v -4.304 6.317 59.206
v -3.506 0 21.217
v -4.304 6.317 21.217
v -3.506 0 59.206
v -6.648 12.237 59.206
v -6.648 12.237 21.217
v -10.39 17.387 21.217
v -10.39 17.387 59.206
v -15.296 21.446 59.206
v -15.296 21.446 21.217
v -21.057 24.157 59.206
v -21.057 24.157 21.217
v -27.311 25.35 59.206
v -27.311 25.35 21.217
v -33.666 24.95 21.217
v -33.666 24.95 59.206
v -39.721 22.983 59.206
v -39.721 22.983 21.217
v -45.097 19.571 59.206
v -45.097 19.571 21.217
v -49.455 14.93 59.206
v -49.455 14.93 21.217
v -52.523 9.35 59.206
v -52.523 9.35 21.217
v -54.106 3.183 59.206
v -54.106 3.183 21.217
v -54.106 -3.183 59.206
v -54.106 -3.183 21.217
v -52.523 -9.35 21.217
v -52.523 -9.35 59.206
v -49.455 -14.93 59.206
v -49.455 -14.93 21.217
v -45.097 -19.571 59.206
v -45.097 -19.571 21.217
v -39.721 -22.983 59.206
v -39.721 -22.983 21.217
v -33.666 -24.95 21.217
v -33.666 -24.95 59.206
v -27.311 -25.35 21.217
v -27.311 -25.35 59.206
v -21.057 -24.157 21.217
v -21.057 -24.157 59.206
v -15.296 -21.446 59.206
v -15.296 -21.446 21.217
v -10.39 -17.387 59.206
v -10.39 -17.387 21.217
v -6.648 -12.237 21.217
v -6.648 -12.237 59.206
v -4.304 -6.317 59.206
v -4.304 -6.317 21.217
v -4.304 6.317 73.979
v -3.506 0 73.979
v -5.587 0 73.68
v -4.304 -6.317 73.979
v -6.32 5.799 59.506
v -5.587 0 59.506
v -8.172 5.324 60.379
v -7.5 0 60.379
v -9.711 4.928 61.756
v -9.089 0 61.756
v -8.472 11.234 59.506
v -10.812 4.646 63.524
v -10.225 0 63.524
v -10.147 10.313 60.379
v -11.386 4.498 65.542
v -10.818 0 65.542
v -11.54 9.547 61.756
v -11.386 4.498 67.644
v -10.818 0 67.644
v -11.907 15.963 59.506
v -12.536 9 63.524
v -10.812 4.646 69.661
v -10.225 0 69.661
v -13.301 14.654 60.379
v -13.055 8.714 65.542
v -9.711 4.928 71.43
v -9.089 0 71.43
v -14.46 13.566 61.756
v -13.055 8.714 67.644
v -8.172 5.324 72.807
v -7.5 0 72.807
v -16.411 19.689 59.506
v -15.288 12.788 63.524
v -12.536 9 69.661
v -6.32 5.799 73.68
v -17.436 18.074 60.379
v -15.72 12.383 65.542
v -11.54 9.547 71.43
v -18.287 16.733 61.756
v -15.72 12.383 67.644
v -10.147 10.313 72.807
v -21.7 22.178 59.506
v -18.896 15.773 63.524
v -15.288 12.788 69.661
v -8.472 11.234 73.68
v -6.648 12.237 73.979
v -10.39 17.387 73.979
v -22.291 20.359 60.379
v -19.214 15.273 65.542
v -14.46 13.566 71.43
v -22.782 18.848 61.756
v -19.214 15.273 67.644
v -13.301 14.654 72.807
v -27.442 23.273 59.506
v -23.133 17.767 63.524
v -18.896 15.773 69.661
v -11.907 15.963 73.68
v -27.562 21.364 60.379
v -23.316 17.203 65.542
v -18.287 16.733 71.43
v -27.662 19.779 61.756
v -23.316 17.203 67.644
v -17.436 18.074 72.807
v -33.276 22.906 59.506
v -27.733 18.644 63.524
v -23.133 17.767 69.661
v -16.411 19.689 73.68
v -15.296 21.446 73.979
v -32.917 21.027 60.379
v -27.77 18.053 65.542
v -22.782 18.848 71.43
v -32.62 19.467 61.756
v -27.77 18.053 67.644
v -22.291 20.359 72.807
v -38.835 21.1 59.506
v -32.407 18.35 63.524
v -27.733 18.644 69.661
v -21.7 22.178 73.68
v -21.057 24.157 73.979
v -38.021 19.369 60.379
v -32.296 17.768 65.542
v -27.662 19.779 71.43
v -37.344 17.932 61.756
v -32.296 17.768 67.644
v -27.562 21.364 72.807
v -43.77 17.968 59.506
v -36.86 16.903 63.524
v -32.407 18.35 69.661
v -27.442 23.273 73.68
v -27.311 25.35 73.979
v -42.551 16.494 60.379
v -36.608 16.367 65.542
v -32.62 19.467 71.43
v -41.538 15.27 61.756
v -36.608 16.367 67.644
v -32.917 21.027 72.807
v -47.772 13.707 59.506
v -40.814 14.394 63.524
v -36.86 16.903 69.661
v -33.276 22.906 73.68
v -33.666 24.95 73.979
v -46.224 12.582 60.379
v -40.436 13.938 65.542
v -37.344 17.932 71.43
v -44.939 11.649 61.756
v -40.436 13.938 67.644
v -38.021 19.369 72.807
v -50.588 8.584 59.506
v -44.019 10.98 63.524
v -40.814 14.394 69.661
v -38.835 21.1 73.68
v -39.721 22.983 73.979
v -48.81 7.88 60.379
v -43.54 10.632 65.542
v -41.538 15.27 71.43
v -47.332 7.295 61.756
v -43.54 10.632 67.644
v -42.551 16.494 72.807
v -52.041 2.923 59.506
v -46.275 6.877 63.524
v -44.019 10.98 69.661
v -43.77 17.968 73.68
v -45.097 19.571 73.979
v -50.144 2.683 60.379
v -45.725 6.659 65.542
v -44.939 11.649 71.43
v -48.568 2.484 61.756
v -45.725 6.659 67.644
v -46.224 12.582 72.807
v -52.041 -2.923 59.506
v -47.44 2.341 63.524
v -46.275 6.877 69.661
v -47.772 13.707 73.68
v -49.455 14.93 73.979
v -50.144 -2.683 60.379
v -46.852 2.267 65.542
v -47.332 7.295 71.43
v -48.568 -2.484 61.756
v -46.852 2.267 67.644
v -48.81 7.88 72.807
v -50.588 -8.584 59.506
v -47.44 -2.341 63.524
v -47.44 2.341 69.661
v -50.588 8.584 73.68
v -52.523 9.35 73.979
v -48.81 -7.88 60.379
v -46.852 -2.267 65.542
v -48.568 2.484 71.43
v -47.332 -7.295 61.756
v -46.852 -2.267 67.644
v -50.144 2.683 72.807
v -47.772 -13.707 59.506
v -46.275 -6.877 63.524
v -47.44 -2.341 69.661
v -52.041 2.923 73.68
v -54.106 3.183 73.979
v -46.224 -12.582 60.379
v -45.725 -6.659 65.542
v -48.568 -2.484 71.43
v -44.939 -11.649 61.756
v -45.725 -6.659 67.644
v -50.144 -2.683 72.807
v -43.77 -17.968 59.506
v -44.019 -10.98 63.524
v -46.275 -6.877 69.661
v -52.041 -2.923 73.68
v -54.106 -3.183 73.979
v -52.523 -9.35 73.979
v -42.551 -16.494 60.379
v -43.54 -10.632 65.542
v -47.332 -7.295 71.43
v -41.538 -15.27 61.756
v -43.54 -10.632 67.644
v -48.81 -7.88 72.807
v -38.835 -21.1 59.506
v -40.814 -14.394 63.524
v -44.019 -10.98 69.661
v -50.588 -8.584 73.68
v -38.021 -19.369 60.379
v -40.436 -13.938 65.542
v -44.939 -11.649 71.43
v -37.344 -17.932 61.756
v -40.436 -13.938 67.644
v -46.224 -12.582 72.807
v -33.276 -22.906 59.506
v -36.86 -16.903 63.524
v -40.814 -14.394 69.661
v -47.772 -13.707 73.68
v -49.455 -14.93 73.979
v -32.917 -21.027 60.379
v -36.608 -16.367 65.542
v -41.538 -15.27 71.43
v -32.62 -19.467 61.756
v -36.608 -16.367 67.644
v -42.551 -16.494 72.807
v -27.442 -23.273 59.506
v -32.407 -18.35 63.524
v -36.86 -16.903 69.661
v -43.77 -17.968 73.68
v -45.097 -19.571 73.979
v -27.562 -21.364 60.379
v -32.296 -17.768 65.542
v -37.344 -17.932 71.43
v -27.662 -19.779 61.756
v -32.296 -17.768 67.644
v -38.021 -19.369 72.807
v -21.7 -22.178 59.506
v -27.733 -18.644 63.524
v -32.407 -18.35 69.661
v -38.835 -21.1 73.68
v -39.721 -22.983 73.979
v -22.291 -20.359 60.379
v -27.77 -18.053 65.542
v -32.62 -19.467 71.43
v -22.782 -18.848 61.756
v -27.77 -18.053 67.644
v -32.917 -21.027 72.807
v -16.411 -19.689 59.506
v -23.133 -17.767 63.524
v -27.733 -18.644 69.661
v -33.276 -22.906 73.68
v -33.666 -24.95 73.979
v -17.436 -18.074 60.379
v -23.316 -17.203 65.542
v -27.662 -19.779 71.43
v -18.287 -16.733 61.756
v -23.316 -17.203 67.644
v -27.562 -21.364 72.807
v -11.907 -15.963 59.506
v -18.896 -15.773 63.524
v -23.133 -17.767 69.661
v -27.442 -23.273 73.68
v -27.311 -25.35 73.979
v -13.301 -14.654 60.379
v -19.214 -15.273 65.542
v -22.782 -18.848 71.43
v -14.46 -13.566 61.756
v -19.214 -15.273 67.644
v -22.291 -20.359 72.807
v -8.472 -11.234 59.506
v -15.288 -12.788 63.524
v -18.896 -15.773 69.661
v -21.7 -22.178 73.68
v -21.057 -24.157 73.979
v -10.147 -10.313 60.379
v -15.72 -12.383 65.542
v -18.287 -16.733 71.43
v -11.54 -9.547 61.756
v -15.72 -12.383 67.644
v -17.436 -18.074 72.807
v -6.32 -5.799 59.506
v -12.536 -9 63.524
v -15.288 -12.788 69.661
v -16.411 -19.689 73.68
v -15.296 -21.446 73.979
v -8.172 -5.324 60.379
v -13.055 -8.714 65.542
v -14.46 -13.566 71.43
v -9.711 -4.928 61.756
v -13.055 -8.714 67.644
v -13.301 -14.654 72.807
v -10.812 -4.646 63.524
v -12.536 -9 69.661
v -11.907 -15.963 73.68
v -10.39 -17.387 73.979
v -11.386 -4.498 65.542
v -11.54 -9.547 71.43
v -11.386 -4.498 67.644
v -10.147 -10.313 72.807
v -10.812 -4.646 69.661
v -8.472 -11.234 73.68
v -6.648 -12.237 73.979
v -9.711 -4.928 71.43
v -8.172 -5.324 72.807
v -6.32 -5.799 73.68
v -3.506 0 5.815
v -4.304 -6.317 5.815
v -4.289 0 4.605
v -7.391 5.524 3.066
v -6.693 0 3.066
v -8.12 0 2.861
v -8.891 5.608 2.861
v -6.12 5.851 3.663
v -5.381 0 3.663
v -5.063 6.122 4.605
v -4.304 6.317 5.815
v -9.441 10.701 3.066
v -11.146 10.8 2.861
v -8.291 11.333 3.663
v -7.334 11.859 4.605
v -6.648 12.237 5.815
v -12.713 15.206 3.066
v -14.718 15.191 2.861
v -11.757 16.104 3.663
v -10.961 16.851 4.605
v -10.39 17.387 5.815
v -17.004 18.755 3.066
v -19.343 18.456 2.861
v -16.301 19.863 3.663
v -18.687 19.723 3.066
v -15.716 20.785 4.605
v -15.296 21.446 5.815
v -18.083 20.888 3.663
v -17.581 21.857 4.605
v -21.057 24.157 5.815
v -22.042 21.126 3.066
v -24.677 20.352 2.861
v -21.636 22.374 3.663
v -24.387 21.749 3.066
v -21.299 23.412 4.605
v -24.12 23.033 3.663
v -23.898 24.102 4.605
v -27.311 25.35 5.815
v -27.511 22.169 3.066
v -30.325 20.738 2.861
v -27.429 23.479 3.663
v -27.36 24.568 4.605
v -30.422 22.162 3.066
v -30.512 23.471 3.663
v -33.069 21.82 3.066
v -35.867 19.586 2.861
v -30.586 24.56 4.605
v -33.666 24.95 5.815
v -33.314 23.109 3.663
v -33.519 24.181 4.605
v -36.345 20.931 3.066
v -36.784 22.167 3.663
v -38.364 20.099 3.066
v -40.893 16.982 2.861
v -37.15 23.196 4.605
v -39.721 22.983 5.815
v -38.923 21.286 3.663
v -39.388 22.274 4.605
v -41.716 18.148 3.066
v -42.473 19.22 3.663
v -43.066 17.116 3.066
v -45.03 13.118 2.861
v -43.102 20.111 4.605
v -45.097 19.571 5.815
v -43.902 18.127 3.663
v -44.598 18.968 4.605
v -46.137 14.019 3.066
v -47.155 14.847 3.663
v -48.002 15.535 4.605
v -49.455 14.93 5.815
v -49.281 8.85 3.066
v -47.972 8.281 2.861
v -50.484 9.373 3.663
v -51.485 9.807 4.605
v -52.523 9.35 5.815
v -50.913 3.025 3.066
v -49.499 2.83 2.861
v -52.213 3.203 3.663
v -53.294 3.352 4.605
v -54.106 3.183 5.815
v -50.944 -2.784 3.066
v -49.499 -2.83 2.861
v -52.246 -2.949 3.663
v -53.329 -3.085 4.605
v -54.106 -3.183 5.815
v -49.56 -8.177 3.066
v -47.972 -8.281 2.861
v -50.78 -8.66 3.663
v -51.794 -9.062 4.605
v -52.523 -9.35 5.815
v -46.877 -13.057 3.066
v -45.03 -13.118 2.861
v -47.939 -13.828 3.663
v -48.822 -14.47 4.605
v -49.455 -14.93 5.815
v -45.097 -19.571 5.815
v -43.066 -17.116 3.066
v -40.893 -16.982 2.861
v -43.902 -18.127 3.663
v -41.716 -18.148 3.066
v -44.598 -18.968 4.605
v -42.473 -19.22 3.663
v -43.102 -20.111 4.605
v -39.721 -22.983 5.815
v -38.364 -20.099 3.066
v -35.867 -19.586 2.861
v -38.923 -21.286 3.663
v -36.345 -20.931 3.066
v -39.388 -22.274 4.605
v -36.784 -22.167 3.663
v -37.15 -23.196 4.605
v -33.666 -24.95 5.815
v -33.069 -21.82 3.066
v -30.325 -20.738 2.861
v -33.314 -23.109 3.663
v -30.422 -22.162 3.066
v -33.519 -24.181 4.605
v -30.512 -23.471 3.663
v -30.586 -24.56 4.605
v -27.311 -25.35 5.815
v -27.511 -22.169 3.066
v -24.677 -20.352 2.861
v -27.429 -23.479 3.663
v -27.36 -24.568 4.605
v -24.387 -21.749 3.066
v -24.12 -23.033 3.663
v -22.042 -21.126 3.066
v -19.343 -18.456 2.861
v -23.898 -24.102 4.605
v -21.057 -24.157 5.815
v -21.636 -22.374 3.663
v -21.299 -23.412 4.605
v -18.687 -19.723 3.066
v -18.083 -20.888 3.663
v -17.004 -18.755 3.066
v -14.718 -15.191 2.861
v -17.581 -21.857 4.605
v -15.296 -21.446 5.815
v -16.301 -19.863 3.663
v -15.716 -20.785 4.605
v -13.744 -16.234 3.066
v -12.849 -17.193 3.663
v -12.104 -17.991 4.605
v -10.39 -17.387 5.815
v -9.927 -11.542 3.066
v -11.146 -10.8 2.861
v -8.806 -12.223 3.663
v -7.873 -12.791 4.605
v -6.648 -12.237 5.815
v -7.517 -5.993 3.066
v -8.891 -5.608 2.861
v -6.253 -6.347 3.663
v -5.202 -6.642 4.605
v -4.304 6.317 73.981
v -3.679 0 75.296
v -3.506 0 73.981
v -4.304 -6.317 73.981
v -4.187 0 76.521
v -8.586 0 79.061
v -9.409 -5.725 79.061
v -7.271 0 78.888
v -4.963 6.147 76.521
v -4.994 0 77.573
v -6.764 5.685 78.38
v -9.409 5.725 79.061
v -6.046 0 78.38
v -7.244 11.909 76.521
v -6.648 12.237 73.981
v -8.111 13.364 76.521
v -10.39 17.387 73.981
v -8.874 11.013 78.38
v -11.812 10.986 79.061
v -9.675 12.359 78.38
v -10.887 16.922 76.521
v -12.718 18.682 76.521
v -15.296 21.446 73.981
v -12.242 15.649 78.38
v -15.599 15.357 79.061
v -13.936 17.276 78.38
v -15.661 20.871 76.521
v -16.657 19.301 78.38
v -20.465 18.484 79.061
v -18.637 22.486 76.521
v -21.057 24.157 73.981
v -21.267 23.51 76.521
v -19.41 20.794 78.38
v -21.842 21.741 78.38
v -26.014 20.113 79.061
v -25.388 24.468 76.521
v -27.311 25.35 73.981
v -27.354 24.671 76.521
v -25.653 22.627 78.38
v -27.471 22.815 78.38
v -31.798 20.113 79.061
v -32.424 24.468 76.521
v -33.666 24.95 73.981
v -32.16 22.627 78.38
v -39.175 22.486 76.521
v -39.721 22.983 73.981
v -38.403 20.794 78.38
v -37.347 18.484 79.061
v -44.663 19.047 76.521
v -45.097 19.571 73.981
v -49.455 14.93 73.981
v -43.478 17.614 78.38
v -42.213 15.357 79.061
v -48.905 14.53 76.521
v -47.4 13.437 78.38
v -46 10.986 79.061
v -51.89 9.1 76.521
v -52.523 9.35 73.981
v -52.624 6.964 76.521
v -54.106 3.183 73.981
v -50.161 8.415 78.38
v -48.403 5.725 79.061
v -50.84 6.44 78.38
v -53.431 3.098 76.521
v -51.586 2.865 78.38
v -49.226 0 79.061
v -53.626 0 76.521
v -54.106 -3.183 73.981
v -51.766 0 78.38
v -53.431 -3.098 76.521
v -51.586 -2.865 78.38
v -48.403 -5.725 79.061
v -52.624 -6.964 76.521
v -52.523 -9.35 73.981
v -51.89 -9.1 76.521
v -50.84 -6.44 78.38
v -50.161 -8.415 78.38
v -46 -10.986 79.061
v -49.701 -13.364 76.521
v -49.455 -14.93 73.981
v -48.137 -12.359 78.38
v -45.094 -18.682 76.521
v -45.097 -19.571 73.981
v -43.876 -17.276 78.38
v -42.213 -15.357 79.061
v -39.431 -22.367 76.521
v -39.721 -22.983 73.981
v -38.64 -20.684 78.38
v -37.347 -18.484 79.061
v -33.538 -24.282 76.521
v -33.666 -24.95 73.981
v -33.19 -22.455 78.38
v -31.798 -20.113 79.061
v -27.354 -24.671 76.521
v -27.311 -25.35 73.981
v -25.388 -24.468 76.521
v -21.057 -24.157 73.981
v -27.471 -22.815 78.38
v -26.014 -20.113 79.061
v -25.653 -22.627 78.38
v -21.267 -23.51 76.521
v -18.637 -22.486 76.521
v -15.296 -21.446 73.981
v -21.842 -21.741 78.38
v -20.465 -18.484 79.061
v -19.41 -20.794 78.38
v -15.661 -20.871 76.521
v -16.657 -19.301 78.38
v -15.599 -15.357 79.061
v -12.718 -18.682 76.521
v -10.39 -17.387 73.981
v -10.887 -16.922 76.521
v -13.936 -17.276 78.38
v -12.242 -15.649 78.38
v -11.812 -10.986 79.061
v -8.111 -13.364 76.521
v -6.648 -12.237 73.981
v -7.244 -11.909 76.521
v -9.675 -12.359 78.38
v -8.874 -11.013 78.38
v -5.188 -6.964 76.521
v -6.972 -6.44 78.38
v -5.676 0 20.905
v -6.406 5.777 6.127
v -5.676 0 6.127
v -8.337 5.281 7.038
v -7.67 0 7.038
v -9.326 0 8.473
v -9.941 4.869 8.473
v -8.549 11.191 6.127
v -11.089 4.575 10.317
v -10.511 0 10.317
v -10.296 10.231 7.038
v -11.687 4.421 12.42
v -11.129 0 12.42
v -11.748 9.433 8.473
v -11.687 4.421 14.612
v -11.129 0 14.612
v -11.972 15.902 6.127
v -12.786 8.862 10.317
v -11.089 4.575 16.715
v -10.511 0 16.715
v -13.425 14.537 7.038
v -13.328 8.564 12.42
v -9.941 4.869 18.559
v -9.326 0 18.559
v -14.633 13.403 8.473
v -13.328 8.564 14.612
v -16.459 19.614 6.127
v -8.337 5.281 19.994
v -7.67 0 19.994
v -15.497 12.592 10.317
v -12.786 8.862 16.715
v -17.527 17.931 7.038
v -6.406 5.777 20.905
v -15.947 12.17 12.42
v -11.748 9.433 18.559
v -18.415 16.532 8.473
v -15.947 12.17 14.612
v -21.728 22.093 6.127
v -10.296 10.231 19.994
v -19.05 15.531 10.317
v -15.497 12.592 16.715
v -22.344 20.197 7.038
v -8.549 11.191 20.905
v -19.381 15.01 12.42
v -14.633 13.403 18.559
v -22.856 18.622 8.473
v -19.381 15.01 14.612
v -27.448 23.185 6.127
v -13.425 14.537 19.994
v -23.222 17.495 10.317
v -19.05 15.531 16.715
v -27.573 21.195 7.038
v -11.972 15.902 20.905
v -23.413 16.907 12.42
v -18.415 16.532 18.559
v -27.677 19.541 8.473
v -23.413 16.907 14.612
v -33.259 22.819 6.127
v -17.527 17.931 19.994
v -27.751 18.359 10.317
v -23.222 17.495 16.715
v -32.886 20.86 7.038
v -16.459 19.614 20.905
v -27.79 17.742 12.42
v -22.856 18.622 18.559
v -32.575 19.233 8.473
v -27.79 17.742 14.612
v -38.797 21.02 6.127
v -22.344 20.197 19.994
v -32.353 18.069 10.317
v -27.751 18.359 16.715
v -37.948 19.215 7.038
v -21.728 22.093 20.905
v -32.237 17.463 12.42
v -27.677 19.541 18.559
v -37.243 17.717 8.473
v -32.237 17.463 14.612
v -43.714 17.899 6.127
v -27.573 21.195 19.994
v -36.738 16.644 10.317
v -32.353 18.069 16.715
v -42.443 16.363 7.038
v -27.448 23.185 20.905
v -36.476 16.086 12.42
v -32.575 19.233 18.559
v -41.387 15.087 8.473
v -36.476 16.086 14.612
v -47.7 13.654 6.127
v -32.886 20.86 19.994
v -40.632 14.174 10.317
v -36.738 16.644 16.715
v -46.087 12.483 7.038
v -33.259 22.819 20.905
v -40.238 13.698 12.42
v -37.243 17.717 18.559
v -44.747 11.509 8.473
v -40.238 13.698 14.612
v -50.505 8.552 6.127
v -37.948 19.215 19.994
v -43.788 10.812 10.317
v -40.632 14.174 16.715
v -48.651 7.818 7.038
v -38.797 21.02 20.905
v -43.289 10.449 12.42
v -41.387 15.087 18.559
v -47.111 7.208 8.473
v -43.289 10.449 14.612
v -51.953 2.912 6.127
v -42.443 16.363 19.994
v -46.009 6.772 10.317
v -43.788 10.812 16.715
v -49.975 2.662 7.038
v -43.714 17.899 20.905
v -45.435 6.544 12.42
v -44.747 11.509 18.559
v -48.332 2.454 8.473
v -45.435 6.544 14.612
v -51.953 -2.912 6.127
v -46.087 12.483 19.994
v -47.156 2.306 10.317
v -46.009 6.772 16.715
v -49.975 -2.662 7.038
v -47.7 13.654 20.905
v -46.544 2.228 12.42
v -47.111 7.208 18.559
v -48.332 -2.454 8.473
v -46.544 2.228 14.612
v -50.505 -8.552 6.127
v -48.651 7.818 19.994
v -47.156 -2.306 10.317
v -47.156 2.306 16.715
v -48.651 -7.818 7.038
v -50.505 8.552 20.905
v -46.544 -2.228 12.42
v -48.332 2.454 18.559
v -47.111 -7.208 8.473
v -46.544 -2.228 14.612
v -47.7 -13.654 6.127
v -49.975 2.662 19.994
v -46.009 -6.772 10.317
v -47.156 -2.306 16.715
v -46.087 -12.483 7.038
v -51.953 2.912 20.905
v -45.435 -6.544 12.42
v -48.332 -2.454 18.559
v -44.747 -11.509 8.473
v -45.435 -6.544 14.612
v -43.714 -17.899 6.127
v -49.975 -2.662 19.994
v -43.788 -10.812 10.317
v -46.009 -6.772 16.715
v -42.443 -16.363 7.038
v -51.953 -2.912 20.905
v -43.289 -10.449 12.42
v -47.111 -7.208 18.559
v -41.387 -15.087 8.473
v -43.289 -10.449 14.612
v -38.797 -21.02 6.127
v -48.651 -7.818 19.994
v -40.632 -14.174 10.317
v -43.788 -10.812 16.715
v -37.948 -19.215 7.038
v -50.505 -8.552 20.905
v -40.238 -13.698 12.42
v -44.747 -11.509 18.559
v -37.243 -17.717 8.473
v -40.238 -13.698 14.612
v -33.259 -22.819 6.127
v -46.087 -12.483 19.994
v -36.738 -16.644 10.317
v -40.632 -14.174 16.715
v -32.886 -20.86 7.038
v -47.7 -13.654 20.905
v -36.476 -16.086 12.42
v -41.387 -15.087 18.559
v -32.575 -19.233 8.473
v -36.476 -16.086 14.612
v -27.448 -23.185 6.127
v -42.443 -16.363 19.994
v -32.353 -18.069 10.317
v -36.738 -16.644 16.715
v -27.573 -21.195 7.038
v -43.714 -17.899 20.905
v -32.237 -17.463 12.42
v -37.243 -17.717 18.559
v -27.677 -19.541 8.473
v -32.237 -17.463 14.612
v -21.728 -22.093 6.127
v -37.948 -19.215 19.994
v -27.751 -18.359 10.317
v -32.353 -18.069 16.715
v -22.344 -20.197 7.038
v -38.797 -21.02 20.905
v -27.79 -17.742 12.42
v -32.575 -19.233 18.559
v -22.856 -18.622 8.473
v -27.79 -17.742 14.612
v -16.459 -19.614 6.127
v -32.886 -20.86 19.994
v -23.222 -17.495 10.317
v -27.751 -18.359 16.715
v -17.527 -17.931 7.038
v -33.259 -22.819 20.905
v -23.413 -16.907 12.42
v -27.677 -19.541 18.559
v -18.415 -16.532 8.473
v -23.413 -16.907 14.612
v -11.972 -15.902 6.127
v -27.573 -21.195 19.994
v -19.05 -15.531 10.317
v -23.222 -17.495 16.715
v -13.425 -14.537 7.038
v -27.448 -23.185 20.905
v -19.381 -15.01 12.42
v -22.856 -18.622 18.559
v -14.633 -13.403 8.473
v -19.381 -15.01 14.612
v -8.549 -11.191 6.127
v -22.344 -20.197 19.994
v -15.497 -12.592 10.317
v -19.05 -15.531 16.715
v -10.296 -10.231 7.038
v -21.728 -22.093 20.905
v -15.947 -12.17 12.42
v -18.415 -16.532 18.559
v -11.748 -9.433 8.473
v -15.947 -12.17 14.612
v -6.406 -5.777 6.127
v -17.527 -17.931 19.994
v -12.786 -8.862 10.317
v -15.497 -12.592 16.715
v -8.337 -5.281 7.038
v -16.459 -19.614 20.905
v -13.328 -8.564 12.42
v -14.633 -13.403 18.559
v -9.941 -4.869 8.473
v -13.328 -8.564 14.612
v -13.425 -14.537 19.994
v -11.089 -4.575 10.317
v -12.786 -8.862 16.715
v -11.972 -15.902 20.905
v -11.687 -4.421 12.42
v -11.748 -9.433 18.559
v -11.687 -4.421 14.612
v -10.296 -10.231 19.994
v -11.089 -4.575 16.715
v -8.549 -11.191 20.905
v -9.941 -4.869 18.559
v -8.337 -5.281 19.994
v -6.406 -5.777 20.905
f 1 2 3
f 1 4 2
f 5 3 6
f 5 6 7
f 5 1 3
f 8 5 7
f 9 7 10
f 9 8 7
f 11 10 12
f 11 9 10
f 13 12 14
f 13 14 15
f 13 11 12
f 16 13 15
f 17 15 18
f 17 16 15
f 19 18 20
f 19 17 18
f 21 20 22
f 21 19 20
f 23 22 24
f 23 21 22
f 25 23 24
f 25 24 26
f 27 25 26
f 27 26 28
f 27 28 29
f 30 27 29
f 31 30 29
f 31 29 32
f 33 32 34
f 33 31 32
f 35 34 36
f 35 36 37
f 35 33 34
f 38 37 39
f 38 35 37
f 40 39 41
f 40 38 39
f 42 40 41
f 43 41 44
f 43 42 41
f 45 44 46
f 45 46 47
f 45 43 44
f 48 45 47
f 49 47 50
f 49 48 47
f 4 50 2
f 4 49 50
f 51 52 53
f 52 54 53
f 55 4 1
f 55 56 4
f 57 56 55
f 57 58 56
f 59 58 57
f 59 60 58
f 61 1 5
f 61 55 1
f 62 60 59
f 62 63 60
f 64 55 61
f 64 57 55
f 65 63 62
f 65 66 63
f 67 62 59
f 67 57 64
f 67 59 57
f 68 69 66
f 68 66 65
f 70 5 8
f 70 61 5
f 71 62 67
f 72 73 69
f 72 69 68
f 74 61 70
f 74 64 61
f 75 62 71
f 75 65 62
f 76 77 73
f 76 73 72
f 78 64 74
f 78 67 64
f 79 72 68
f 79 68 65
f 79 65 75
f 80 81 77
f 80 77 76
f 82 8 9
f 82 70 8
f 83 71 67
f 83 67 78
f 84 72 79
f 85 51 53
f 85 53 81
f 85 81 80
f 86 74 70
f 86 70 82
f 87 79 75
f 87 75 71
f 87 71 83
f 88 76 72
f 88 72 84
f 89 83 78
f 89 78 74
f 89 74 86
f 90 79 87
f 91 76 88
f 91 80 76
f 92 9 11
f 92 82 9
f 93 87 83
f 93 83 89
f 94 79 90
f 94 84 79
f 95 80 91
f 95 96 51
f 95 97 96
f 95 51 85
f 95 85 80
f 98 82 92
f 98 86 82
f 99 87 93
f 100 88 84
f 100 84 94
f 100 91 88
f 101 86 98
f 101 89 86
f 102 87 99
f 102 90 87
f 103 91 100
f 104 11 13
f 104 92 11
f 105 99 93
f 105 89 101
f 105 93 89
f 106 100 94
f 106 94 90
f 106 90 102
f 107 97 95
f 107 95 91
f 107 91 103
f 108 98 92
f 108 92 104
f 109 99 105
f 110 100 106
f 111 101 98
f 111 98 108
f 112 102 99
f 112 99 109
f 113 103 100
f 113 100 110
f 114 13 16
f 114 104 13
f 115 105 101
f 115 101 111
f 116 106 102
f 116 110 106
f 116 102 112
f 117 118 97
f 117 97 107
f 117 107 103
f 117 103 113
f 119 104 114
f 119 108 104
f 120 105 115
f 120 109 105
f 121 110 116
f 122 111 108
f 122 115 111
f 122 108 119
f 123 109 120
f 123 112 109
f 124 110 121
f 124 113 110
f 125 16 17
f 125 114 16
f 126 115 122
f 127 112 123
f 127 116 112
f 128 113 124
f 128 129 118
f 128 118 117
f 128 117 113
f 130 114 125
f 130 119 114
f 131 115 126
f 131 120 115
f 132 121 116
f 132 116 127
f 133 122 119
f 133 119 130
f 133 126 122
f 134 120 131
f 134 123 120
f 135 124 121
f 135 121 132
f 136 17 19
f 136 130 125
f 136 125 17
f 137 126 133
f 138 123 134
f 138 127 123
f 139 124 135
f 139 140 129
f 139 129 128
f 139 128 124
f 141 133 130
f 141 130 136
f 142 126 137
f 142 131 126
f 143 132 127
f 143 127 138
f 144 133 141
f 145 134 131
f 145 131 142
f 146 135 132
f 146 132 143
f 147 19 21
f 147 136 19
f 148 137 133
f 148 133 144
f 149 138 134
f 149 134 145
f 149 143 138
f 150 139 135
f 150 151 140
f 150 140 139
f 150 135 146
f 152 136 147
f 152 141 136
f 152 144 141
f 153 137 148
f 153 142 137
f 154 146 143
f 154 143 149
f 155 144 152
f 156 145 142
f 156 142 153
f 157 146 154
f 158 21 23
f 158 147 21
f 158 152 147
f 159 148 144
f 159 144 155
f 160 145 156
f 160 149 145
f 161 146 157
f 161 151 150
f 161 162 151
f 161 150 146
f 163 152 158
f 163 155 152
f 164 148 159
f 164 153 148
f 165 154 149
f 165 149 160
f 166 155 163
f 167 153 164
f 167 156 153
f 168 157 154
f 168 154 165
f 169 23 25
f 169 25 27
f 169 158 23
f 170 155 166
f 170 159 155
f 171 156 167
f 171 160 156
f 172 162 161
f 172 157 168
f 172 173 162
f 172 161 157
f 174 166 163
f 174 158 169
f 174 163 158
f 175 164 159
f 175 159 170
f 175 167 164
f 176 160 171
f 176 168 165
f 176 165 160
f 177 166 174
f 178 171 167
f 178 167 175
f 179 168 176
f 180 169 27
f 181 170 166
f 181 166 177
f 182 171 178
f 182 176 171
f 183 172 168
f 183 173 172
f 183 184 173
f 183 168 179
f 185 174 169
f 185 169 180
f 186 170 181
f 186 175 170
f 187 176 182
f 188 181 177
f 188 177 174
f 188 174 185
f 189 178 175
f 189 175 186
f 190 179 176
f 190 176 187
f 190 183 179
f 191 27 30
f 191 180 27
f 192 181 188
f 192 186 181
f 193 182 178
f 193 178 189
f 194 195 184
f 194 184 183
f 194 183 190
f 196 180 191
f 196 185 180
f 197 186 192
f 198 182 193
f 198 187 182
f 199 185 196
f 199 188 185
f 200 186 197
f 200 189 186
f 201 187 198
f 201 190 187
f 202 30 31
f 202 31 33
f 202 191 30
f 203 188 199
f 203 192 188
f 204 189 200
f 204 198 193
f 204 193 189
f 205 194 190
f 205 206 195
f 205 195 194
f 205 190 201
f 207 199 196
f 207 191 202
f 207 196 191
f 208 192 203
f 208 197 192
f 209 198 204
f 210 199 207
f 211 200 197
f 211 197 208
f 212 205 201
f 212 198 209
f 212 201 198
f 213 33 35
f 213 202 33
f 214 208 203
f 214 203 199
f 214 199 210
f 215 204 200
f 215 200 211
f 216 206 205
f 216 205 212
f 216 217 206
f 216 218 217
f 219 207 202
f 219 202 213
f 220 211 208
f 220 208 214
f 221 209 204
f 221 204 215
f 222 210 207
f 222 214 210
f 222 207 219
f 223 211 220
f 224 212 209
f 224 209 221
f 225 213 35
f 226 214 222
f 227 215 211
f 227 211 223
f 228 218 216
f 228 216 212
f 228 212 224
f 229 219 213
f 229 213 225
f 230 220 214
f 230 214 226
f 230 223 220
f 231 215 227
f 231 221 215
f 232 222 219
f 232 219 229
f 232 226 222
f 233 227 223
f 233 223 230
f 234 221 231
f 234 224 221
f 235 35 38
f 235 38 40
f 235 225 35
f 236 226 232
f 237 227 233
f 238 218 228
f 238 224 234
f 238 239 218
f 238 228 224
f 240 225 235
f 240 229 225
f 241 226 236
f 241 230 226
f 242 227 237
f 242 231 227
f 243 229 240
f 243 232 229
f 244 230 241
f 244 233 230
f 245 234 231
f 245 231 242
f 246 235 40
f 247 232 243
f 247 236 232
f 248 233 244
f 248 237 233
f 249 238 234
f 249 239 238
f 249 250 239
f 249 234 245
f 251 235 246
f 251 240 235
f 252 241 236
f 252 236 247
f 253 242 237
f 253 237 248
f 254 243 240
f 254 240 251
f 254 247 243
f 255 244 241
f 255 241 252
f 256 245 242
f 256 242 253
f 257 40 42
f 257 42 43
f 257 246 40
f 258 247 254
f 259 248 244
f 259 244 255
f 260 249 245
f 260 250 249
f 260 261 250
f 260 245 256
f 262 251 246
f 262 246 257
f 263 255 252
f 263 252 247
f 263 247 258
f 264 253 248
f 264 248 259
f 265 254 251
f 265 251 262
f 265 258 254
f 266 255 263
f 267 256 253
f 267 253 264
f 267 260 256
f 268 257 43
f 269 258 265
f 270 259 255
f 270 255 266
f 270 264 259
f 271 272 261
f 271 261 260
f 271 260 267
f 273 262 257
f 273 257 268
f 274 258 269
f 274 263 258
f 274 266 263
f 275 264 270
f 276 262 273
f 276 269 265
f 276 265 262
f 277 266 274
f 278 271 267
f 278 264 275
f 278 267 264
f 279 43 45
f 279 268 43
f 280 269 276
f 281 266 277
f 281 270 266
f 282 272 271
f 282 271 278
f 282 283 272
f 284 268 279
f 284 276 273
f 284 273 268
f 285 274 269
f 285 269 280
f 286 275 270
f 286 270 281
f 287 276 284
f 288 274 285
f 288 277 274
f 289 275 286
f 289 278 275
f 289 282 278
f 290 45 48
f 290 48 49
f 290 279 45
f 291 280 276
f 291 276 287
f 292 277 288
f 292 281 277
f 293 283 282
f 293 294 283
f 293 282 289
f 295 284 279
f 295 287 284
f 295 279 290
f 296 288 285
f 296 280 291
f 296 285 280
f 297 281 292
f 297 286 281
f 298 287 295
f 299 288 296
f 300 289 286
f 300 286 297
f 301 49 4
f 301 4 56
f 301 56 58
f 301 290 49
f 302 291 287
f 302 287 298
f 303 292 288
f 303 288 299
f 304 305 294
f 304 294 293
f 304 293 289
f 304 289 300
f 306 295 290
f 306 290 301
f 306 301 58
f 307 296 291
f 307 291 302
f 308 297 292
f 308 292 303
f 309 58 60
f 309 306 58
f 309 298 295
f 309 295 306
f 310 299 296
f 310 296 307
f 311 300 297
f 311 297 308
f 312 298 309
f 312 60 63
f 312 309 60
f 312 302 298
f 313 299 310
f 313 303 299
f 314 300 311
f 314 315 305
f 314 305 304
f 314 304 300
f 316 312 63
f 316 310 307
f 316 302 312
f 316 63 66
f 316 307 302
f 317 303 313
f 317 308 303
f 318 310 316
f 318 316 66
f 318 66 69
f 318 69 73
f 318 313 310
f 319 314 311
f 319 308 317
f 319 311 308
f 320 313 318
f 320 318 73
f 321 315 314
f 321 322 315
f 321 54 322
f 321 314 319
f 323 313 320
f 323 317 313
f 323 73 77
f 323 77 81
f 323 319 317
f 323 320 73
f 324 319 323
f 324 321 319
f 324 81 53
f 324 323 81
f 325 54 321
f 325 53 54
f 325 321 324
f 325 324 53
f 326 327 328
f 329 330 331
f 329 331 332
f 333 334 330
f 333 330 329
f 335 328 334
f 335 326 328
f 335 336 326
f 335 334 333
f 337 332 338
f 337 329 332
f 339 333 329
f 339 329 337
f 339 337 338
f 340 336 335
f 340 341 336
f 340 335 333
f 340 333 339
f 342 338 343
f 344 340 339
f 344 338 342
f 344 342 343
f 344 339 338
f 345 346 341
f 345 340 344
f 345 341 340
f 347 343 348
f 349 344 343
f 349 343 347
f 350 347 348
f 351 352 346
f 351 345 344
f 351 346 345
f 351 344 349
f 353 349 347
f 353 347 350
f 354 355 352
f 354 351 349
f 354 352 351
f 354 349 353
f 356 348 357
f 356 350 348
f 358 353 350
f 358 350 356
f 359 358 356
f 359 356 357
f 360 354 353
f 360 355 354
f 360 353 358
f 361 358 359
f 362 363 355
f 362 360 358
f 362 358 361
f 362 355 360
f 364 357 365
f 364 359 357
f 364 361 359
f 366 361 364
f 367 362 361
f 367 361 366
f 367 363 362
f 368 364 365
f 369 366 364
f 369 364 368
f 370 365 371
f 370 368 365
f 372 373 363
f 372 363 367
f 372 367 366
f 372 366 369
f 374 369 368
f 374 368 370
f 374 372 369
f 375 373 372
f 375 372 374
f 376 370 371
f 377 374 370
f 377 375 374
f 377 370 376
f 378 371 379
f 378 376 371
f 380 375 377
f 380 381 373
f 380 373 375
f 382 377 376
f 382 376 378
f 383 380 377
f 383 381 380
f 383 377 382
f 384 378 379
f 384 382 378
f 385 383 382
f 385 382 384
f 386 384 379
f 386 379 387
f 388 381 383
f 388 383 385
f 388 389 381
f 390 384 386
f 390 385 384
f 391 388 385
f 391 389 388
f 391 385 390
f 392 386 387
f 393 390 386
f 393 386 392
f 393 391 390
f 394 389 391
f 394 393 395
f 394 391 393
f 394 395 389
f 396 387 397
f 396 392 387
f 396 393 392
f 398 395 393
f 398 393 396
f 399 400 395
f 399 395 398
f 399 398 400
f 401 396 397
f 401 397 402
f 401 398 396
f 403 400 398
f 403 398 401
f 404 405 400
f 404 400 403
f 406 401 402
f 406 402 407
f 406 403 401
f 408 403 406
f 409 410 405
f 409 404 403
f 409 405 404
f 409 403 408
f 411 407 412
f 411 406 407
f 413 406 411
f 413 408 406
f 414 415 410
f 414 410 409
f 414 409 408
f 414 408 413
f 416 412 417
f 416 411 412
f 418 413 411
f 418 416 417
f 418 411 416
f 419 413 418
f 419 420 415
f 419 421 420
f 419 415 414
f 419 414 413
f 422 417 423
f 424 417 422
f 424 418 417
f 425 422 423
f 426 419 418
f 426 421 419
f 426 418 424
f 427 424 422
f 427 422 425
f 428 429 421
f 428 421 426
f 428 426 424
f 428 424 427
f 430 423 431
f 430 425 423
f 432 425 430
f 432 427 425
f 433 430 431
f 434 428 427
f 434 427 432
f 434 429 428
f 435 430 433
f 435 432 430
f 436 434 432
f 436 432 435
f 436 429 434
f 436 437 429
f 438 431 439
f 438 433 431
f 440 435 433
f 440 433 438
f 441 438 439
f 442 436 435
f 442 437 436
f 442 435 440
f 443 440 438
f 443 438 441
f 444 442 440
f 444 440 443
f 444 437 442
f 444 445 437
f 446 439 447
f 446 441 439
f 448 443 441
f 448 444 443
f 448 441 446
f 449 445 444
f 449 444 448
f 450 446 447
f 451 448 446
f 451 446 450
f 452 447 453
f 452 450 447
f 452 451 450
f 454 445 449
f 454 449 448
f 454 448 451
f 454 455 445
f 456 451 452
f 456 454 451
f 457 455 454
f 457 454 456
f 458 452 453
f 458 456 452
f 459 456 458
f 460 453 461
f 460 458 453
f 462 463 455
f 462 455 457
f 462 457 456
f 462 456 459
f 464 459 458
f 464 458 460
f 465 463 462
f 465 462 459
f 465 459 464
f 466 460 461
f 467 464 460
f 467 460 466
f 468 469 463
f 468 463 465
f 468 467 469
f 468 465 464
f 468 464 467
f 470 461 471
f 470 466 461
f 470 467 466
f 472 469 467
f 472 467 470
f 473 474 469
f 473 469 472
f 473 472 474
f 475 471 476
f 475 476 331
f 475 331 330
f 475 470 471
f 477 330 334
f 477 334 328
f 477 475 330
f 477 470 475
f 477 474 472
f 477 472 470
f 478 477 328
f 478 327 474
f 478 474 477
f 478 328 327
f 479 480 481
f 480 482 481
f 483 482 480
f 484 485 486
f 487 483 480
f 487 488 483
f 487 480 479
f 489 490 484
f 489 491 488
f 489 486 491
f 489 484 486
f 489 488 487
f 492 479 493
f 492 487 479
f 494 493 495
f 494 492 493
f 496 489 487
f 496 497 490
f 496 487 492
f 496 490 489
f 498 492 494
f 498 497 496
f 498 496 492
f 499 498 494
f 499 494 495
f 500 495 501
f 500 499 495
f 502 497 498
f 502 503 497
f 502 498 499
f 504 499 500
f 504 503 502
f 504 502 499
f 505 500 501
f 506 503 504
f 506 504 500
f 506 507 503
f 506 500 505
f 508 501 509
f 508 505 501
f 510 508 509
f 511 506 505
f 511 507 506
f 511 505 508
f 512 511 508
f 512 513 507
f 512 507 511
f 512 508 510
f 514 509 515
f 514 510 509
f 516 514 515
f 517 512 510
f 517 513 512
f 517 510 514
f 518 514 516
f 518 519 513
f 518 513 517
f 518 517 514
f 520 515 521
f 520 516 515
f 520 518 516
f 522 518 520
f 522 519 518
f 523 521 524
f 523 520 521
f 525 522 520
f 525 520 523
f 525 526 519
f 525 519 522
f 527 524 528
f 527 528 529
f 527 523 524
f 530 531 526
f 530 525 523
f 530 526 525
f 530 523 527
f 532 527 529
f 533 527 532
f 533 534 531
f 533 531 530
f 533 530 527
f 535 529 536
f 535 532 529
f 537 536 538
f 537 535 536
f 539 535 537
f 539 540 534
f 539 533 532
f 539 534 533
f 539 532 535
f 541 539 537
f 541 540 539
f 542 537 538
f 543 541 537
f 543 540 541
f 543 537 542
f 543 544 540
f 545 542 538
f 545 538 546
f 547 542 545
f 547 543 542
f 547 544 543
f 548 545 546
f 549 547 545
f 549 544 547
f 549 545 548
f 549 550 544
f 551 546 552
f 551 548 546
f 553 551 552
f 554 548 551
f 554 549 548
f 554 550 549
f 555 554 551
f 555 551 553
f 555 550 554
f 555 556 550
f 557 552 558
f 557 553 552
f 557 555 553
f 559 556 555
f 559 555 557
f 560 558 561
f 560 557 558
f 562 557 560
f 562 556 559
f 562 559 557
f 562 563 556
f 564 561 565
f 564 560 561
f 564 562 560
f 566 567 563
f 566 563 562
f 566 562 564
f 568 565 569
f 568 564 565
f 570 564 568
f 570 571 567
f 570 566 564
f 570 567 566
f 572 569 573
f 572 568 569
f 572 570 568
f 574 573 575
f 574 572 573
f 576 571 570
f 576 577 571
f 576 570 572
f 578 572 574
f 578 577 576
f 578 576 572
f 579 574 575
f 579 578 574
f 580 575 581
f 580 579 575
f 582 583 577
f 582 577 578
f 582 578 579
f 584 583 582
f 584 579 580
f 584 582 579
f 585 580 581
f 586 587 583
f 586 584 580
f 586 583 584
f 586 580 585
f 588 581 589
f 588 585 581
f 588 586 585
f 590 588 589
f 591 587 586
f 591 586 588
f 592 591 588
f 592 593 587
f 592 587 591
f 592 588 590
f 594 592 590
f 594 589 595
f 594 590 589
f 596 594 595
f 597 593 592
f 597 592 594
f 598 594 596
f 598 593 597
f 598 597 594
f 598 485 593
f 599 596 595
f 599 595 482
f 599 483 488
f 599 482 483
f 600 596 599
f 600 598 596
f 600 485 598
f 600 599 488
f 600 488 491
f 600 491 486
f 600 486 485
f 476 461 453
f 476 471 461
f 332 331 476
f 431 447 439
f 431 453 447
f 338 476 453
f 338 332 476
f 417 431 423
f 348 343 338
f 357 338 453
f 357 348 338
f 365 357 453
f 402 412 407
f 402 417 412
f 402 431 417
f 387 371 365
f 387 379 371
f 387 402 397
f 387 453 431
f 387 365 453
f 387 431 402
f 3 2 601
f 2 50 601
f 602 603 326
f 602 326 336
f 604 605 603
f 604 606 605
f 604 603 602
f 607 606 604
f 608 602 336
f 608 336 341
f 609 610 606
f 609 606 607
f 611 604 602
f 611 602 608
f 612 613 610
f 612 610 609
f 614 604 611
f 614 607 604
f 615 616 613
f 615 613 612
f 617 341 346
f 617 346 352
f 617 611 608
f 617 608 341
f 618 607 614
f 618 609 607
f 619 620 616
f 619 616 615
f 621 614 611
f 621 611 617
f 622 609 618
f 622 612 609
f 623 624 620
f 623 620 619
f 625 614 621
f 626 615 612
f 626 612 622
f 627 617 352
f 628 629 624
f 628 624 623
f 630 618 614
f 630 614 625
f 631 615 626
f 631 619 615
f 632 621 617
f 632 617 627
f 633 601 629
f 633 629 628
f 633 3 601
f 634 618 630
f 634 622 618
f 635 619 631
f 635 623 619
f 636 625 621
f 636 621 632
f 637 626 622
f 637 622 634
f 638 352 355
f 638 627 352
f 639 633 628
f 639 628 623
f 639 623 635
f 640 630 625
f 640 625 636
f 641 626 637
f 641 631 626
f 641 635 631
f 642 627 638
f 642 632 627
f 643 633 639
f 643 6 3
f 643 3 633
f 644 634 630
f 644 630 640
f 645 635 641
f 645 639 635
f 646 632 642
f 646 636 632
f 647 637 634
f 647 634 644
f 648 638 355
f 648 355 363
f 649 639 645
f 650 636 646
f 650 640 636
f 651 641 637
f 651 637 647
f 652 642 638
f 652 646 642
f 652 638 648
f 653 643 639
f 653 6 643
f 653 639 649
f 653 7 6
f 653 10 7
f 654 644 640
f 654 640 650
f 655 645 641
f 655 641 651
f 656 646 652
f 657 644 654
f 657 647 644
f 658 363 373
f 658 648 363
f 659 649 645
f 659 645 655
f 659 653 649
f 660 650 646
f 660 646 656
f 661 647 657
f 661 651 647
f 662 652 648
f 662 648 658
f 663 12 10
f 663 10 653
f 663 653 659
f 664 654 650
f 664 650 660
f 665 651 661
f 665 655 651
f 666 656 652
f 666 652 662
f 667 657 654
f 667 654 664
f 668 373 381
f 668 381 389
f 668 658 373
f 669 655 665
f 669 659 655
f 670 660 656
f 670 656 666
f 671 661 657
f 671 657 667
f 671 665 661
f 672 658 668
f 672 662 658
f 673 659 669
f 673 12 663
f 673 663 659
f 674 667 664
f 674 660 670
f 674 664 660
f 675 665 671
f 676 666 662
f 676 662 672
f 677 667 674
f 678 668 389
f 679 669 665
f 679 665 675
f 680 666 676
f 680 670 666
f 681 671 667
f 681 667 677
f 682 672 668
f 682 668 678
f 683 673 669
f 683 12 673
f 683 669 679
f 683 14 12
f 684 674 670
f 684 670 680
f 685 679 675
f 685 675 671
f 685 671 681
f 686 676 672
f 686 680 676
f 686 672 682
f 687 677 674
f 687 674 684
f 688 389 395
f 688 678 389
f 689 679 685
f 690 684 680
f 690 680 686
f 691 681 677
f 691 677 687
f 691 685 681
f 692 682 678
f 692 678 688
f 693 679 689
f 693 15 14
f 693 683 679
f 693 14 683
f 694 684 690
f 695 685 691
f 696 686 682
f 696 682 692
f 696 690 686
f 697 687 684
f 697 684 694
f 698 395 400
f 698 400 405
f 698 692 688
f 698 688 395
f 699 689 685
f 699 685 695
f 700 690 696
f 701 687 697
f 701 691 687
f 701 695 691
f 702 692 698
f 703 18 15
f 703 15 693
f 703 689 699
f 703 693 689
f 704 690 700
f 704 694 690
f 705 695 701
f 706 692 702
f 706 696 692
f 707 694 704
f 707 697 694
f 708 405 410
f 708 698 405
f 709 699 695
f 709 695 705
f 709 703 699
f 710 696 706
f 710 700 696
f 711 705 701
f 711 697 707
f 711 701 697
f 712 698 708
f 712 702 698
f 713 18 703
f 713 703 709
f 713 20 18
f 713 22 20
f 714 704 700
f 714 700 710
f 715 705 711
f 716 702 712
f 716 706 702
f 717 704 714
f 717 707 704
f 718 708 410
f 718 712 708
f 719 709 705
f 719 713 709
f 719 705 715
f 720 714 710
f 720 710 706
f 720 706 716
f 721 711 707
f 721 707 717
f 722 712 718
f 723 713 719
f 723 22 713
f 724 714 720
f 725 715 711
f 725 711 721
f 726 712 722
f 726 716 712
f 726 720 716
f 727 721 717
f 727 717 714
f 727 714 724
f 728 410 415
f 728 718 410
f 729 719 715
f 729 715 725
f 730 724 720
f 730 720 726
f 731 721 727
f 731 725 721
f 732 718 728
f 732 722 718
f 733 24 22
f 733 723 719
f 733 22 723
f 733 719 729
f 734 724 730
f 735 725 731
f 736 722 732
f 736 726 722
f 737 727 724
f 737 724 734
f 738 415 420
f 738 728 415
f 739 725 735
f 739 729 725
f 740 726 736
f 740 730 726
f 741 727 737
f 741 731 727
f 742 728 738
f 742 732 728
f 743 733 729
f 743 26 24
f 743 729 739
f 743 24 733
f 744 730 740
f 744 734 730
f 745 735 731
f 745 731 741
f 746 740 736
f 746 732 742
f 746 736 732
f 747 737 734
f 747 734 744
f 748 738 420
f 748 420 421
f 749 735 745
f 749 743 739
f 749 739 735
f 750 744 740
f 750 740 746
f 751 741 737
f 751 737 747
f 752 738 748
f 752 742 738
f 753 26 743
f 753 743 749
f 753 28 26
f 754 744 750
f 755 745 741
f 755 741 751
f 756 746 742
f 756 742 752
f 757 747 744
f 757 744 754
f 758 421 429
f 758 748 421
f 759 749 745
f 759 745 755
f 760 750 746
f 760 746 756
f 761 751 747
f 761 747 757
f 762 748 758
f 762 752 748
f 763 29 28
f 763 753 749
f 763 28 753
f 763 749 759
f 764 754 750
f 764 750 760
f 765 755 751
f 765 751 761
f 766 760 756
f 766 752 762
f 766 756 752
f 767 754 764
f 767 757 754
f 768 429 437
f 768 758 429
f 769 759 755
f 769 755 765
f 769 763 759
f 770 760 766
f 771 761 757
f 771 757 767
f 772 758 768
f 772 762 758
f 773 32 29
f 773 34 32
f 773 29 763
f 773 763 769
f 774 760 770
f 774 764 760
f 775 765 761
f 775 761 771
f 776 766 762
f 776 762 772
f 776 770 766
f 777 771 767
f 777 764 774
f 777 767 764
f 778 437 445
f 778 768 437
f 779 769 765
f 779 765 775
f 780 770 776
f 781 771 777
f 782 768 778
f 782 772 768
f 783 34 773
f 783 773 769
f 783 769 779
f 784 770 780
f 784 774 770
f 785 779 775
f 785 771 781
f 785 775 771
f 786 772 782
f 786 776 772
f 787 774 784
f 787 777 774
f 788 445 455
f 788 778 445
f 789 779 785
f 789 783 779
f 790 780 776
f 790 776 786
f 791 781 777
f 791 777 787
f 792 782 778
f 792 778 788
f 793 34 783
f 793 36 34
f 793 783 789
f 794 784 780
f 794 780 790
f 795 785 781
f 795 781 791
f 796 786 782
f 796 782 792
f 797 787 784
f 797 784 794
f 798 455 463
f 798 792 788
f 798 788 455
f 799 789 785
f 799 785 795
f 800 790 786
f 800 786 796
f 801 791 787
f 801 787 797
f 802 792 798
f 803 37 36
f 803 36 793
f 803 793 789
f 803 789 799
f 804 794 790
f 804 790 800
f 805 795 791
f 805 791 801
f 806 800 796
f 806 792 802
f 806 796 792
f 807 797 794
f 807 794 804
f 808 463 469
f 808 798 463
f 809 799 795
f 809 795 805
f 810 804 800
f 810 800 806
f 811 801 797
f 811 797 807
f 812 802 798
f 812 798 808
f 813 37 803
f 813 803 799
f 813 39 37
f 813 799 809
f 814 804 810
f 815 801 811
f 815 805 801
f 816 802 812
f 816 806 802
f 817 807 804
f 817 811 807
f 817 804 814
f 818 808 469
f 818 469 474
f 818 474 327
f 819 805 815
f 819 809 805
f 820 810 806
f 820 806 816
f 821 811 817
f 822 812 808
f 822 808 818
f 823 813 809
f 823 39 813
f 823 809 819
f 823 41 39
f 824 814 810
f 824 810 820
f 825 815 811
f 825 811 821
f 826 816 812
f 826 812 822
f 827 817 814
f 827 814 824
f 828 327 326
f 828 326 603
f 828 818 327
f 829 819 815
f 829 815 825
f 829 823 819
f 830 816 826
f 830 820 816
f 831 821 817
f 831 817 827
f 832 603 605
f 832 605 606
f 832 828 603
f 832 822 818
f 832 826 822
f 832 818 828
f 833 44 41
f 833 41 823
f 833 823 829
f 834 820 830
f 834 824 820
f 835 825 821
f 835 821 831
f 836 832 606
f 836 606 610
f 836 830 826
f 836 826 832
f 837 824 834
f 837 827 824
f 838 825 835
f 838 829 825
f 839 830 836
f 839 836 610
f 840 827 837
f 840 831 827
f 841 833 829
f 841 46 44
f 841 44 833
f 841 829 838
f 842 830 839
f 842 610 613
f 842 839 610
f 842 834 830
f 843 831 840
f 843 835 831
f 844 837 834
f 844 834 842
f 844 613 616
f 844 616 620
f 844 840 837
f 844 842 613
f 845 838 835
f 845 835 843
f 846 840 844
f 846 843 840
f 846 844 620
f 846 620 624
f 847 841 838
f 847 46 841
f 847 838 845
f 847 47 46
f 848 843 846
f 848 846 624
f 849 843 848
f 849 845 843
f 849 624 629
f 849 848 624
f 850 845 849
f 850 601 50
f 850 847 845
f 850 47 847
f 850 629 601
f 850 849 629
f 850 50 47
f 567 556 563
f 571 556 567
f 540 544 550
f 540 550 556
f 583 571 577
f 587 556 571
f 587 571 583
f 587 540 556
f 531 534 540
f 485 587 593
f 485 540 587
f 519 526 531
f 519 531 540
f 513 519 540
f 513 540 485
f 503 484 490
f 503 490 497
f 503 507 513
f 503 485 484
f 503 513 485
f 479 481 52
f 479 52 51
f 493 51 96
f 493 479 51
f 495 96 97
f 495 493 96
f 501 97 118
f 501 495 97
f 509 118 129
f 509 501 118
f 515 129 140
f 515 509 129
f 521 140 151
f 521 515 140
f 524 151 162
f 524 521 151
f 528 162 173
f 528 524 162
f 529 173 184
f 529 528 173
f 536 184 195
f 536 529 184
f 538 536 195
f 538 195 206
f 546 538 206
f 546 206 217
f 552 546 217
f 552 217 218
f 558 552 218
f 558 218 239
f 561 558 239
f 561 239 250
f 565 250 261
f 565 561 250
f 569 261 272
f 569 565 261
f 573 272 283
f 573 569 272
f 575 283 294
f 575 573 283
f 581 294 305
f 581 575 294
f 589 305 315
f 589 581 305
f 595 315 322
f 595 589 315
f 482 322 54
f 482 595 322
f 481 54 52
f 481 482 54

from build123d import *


# Not quite as in the source:
# - a fillet or chamfer that OpenCascade refuses, or shapes differently, is made with other operations: its cross-section is extruded or revolved along the edge and cut away or added


with BuildPart() as f1:
    # F0 (on Front) → F1 (revolve)
    with BuildSketch(Plane.XZ):
        with BuildLine():
            Line((-28.9062019438, 2.8610236477), (-3.5062019438, 2.8610236477))
            Line((-3.5062019438, 2.8610236477), (-3.5062019438, 5.8150213674))
            ThreePointArc((-3.5062019438, 5.8150213674), (-11.2070506632, 13.5158700868), (-3.5062019438, 21.2167188063))
            Line((-3.5062019438, 21.2167188063), (-3.5062019438, 59.2063053419))
            ThreePointArc((-3.5062019438, 59.2063053419), (-10.8926867883, 66.5927901864), (-3.5062019438, 73.9792750309))
            Line((-3.5062019438, 73.9792750309), (-3.5062019438, 79.0610236477))
            Line((-3.5062019438, 79.0610236477), (-28.9062019438, 79.0610236477))
            Line((-28.9062019438, 79.0610236477), (-28.9062019438, 2.8610236477))
        make_face()
    revolve(axis=Axis((-28.9062019438, 0, 40.9610236477), (0, 0, 1)))

    # F2: fillet of radius 5.08 on 2 edges, made by hand

    # F2_s1 → F2_t2 (revolve, cut)
    with BuildSketch(Plane.XZ):
        with BuildLine():
            ThreePointArc((-3.5062019438, 73.9810236477), (-4.9940994953, 77.5731260961), (-8.5862019438, 79.0610236477))
            Line((-8.5862019438, 79.0610236477), (-8.5862019438, 79.1626236477))
            Line((-8.5862019438, 79.1626236477), (-3.4046019438, 79.1626236477))
            Line((-3.4046019438, 79.1626236477), (-3.4046019438, 73.9810236477))
            Line((-3.4046019438, 73.9810236477), (-3.5062019438, 73.9810236477))
        make_face()
    revolve(axis=Axis((-28.9062019438, 0, 79.0610236477), (0, 0, 1)), mode=Mode.SUBTRACT)

    # F2_s3 → F2_t4 (revolve, cut)
    with BuildSketch(Plane.XZ):
        with BuildLine():
            ThreePointArc((-8.1199330049, 2.8610236477), (-5.3807444009, 3.6627943654), (-3.5062019438, 5.8150213674))
            Line((-3.5062019438, 5.8150213674), (-3.4139273225, 5.7725013218))
            ThreePointArc((-3.4139273225, 5.7725013218), (-3.4046019438, 4.3380225076), (-3.4046019438, 2.8610236477))
            Line((-3.4046019438, 2.8610236477), (-3.5062019438, 2.7594236477))
            Line((-3.5062019438, 2.7594236477), (-8.1199330049, 2.7594236477))
            Line((-8.1199330049, 2.7594236477), (-8.1199330049, 2.8610236477))
        make_face()
    revolve(axis=Axis((-28.9062019438, 0, 2.8610236477), (0, 0, 1)), mode=Mode.SUBTRACT)


solid = f1.part
